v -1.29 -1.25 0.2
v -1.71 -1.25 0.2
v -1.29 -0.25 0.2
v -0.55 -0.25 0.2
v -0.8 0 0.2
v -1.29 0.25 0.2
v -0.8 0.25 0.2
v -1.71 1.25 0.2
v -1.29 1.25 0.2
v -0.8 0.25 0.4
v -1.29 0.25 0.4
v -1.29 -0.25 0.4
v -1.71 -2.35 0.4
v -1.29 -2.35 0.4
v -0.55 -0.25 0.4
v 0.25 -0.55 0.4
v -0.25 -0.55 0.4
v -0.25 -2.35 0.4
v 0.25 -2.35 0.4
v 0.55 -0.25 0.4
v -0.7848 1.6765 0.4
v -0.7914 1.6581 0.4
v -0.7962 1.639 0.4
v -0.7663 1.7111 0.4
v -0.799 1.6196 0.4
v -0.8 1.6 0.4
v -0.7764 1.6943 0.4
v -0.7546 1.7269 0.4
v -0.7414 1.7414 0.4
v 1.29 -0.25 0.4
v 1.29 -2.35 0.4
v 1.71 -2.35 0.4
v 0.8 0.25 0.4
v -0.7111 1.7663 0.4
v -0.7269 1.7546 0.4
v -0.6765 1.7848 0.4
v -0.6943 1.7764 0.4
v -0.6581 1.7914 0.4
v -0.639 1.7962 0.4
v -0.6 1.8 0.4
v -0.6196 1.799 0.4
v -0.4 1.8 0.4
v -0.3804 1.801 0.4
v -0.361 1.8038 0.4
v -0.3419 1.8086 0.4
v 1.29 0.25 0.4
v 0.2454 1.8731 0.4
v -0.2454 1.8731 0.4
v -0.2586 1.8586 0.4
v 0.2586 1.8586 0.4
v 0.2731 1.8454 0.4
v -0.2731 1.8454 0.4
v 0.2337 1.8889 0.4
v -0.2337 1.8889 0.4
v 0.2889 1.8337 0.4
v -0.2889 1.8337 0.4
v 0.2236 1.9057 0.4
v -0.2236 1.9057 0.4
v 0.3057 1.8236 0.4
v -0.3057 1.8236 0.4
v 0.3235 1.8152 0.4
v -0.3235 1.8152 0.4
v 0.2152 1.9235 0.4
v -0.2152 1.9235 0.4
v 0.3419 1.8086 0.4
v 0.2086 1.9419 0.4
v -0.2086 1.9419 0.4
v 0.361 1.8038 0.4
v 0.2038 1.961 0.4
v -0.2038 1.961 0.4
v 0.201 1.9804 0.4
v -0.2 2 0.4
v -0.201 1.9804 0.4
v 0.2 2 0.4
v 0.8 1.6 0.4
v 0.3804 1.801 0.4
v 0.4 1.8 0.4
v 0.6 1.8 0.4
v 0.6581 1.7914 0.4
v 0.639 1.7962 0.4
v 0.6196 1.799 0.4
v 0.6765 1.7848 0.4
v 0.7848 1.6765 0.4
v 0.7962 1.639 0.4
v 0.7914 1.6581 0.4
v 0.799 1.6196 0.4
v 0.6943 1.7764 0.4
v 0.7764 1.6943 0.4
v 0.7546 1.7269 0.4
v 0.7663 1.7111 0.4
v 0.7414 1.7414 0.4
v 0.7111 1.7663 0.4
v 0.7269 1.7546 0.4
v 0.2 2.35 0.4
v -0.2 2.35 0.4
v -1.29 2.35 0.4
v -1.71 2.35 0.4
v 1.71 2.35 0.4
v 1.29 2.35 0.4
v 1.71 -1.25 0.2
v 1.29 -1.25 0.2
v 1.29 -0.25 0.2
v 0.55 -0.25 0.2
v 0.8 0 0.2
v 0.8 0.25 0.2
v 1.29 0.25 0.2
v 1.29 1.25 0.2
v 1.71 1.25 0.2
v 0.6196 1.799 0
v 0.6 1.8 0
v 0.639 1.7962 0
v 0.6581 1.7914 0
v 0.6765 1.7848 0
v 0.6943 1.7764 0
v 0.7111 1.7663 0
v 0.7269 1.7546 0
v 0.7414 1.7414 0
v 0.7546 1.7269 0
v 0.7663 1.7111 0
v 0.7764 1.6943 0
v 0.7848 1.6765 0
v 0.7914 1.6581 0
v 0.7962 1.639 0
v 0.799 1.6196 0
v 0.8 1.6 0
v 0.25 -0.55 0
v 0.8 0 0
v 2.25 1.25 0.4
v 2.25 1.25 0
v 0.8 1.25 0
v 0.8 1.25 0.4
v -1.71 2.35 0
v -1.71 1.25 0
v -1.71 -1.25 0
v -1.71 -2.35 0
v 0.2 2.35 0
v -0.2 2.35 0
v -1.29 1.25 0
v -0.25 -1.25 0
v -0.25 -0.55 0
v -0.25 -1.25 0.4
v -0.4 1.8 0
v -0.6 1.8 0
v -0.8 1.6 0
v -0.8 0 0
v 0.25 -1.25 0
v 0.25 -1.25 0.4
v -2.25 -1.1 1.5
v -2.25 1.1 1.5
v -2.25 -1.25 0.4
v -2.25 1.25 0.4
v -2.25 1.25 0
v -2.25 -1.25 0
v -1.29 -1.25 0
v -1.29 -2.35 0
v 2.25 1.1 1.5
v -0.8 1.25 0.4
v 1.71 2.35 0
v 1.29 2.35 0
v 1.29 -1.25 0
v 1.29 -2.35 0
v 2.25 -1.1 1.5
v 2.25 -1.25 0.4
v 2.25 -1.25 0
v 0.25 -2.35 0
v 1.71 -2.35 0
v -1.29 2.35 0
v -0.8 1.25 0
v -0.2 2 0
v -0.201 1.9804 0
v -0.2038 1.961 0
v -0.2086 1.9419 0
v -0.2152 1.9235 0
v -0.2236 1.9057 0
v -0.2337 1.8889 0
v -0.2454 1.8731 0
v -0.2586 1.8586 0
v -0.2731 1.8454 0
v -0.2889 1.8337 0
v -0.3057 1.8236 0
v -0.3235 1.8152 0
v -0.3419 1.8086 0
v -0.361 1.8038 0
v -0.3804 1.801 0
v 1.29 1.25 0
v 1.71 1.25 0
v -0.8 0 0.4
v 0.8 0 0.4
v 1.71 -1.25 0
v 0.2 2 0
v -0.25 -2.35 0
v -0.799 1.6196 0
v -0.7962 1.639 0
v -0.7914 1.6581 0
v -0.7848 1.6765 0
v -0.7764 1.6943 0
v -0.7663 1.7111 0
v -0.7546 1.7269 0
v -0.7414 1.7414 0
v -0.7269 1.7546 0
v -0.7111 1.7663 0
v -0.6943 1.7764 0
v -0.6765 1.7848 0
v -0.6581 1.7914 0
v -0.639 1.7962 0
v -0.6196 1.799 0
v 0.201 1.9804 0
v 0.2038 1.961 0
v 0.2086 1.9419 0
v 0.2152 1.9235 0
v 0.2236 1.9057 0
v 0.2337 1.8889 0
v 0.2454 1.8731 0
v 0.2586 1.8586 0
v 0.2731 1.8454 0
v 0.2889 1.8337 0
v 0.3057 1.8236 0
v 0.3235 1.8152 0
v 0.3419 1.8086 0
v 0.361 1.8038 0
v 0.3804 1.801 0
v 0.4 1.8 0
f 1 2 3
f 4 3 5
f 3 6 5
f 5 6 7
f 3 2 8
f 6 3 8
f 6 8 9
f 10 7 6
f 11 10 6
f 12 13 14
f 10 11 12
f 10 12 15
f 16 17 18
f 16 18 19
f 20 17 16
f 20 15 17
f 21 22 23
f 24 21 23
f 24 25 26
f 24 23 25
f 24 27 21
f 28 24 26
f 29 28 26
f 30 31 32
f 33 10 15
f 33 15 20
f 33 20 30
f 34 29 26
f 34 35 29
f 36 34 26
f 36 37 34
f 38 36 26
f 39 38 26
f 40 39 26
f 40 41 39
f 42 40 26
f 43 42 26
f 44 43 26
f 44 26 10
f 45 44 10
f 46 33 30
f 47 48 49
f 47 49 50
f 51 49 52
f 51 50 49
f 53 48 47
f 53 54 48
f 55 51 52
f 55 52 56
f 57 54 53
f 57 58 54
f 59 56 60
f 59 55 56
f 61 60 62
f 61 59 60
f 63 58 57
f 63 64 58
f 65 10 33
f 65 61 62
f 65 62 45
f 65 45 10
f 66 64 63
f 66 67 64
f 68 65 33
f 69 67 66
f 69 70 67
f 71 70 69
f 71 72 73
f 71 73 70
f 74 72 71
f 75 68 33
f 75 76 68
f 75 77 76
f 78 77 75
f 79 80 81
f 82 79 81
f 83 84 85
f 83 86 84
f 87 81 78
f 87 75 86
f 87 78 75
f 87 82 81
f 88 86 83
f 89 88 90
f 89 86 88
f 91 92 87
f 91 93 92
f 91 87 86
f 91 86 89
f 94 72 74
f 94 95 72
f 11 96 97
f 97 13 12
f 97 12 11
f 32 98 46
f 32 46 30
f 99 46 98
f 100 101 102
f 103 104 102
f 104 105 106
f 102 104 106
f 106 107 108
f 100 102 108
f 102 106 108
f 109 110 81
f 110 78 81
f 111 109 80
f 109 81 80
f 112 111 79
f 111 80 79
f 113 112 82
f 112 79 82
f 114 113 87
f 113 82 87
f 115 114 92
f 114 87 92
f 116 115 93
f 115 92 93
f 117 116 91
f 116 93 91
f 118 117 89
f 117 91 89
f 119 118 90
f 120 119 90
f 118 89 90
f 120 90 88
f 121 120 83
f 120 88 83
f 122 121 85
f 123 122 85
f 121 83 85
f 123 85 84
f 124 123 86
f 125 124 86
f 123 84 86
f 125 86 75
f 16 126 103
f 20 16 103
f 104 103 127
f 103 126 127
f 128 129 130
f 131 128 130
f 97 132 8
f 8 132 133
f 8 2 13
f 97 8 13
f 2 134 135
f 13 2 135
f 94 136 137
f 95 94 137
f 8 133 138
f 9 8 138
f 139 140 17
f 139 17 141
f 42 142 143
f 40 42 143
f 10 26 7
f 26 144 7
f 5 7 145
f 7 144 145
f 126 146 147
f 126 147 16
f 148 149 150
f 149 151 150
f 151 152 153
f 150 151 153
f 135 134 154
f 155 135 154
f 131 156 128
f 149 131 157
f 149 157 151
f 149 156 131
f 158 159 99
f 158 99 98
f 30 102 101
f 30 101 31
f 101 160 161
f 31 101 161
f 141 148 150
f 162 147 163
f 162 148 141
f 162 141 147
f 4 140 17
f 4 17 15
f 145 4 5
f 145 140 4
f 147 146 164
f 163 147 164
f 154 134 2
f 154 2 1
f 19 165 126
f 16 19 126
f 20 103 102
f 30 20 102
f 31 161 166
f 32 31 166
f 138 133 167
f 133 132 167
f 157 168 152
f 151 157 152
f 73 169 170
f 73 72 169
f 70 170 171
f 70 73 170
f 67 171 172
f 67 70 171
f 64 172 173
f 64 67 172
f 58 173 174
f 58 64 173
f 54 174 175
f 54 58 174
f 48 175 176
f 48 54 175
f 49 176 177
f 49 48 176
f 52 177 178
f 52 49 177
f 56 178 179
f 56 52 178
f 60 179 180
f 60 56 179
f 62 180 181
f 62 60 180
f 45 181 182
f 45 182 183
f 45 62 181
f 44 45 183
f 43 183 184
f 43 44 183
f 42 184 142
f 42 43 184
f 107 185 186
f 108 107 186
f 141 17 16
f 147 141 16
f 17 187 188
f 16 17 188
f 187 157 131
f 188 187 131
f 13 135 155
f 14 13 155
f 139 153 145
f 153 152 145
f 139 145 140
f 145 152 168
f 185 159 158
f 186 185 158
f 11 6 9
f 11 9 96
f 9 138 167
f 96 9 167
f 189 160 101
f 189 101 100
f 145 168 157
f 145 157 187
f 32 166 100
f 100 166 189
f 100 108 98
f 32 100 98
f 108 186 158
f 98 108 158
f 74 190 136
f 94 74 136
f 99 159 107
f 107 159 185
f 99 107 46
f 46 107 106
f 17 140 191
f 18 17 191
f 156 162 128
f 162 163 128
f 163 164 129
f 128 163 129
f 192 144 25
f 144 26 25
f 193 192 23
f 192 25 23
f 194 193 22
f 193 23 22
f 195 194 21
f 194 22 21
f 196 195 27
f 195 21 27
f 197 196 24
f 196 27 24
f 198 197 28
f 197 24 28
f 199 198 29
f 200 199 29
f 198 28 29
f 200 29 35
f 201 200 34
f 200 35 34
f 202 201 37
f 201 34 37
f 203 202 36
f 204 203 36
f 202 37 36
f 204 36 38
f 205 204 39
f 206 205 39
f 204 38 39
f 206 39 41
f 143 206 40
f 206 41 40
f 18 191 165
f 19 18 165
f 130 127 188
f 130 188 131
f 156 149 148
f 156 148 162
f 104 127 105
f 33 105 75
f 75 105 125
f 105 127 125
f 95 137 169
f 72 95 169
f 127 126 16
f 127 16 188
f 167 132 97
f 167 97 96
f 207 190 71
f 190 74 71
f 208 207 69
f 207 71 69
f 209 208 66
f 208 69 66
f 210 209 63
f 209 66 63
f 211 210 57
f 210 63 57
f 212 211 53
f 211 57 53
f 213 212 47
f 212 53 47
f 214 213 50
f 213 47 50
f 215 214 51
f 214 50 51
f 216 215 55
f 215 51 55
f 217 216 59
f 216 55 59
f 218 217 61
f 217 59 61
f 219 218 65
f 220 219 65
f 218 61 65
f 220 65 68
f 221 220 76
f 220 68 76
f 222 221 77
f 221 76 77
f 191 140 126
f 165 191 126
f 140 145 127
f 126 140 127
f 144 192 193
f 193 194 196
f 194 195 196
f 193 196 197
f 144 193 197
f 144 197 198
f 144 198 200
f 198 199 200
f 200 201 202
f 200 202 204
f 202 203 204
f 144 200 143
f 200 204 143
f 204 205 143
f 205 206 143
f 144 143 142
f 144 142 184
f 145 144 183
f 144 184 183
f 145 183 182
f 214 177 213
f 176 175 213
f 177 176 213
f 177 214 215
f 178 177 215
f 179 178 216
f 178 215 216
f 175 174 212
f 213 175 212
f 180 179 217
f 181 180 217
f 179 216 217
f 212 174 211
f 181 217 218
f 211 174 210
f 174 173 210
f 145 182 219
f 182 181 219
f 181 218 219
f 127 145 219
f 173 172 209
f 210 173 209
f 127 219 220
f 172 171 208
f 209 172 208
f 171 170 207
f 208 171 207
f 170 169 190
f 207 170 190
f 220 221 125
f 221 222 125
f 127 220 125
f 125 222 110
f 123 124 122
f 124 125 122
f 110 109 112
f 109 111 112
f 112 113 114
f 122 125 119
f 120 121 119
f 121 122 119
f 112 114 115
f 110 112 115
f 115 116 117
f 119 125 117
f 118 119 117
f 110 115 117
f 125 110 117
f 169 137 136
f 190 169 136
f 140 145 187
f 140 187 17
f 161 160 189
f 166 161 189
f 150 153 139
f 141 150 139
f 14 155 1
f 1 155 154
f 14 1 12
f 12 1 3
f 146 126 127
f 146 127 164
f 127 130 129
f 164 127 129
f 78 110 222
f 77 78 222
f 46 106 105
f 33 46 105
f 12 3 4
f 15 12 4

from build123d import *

# Parameters (mm, degrees)
F4_W       = 1.6
F4_H       = 1
F4_W_2     = 0.42
F4_H_2     = 0.5
F4_H_3     = 1.1
F4_W_3     = 0.5
F5_DEPTH   = 0.4
F6_DEPTH   = 0.2
F7_R       = 0.2
F4_W_4     = 0.49
F8_DEPTH   = 1.5
F9_SIZE2   = 0.15
F9_SIZE    = 1.1
F9_2_SIZE2 = 0.15
F9_2_SIZE  = 1.1
F10_DEPTH  = 0.4


with BuildPart() as f5:
    # F4 (on Top) → F5 (new body)
    with BuildSketch(Plane.XY):
        with Locations((0, 0.75)):
            Rectangle(F4_W, F4_H)
        Polygon((-1.29, -0.25), (-0.55, -0.25), (-0.8, 0), (-0.8, 0.25), (-1.29, 0.25), align=None)
        Polygon((-0.55, -0.25), (0.55, -0.25), (0.8, 0), (0.8, 0.25), (-0.8, 0.25), (-0.8, 0), align=None)
        Polygon((-0.25, -1.25), (0.25, -1.25), (0.25, -0.55), (0.55, -0.25), (-0.55, -0.25), (-0.25, -0.55), align=None)
        with Locations((-1.5, 0)):
            Rectangle(F4_W_2, F4_H_2)
        with Locations((-1.5, 0.75)):
            Rectangle(F4_W_2, F4_H)
        with Locations((-1.5, -0.75)):
            Rectangle(F4_W_2, F4_H)
        with Locations((-1.5, -1.8)):
            Rectangle(F4_W_2, F4_H_3)
        with Locations((0, -1.8)):
            Rectangle(F4_W_3, F4_H_3)
        Polygon((0.55, -0.25), (1.29, -0.25), (1.29, 0.25), (0.8, 0.25), (0.8, 0), align=None)
        with Locations((1.5, -0.75)):
            Rectangle(F4_W_2, F4_H)
        with Locations((1.5, -1.8)):
            Rectangle(F4_W_2, F4_H_3)
        with Locations((1.5, 0)):
            Rectangle(F4_W_2, F4_H_2)
        with Locations((1.5, 0.75)):
            Rectangle(F4_W_2, F4_H)
        with Locations((1.5, 1.8)):
            Rectangle(F4_W_2, F4_H_3)
        Polygon((-0.8, 1.25), (0.8, 1.25), (0.8, 1.8), (0.2, 1.8), (0.2, 2.35), (-0.2, 2.35), (-0.2, 1.8), (-0.8, 1.8), align=None)
        with Locations((-1.5, 1.8)):
            Rectangle(F4_W_2, F4_H_3)
    extrude(amount=F5_DEPTH)

    # F4 (on Top) → F6 (cut)
    with BuildSketch(Plane.XY):
        with Locations((-1.5, -0.75)):
            Rectangle(F4_W_2, F4_H)
        with Locations((-1.5, 0)):
            Rectangle(F4_W_2, F4_H_2)
        with Locations((-1.5, 0.75)):
            Rectangle(F4_W_2, F4_H)
        Polygon((-1.29, -0.25), (-0.55, -0.25), (-0.8, 0), (-0.8, 0.25), (-1.29, 0.25), align=None)
        Polygon((0.55, -0.25), (1.29, -0.25), (1.29, 0.25), (0.8, 0.25), (0.8, 0), align=None)
        with Locations((1.5, -0.75)):
            Rectangle(F4_W_2, F4_H)
        with Locations((1.5, 0)):
            Rectangle(F4_W_2, F4_H_2)
        with Locations((1.5, 0.75)):
            Rectangle(F4_W_2, F4_H)
    extrude(amount=F6_DEPTH, mode=Mode.SUBTRACT)

    # F7
    f7_edges = [f5.edges().sort_by_distance(p)[0] for p in [
        (-0.8, 1.8, 0.2),
        (-0.2, 1.8, 0.2),
        (0.2, 1.8, 0.2),
        (0.8, 1.8, 0.2),
    ]]
    fillet(f7_edges, radius=F7_R)


with BuildPart() as f8:
    # F4 (on Top) → F8 (new body)
    with BuildSketch(Plane.XY):
        Polygon((-1.29, -1.25), (-0.25, -1.25), (-0.25, -0.55), (-0.55, -0.25), (-1.29, -0.25), align=None)
        with Locations((-1.5, -0.75)):
            Rectangle(F4_W_2, F4_H)
        with Locations((-1.5, 0)):
            Rectangle(F4_W_2, F4_H_2)
        with Locations((-1.5, 0.75)):
            Rectangle(F4_W_2, F4_H)
        with Locations((-1.045, 0.75)):
            Rectangle(F4_W_4, F4_H)
        with Locations((0, 0.75)):
            Rectangle(F4_W, F4_H)
        Polygon((-1.29, -0.25), (-0.55, -0.25), (-0.8, 0), (-0.8, 0.25), (-1.29, 0.25), align=None)
        Polygon((-0.25, -1.25), (0.25, -1.25), (0.25, -0.55), (0.55, -0.25), (-0.55, -0.25), (-0.25, -0.55), align=None)
        Polygon((-0.55, -0.25), (0.55, -0.25), (0.8, 0), (0.8, 0.25), (-0.8, 0.25), (-0.8, 0), align=None)
        Polygon((0.25, -1.25), (1.29, -1.25), (1.29, -0.25), (0.55, -0.25), (0.25, -0.55), align=None)
        with Locations((1.5, -0.75)):
            Rectangle(F4_W_2, F4_H)
        Polygon((0.55, -0.25), (1.29, -0.25), (1.29, 0.25), (0.8, 0.25), (0.8, 0), align=None)
        with Locations((1.5, 0)):
            Rectangle(F4_W_2, F4_H_2)
        Polygon((1.71, -1.25), (2.25, -1.25), (2.25, 1.25), (1.71, 1.25), (1.71, 0.25), (1.71, -0.25), align=None)
        with Locations((1.045, 0.75)):
            Rectangle(F4_W_4, F4_H)
        with Locations((1.5, 0.75)):
            Rectangle(F4_W_2, F4_H)
        Polygon((-2.25, -1.25), (-1.71, -1.25), (-1.71, -0.25), (-1.71, 0.25), (-1.71, 1.25), (-2.25, 1.25), align=None)
    extrude(amount=F8_DEPTH)

    # F9
    f9_edges = [f8.edges().sort_by_distance(p)[0] for p in [
        (0, -1.25, 1.5),
    ]]
    f9_side = f8.faces().sort_by_distance((0, -1.25, 0.75))[0]
    chamfer(f9_edges, length=F9_SIZE, length2=F9_SIZE2, reference=f9_side)

    # F9#2
    f9_2_edges = [f8.edges().sort_by_distance(p)[0] for p in [
        (0, 1.25, 1.5),
    ]]
    f9_2_side = f8.faces().sort_by_distance((0, 1.25, 0.75))[0]
    chamfer(f9_2_edges, length=F9_2_SIZE, length2=F9_2_SIZE2, reference=f9_2_side)

    # F4 (on Top) → F10 (cut)
    with BuildSketch(Plane.XY):
        Polygon((-0.55, -0.25), (0.55, -0.25), (0.8, 0), (0.8, 0.25), (-0.8, 0.25), (-0.8, 0), align=None)
        Polygon((-0.25, -1.25), (0.25, -1.25), (0.25, -0.55), (0.55, -0.25), (-0.55, -0.25), (-0.25, -0.55), align=None)
        with Locations((0, 0.75)):
            Rectangle(F4_W, F4_H)
    extrude(amount=F10_DEPTH, mode=Mode.SUBTRACT)


solid = Compound([f5.part, f8.part])
